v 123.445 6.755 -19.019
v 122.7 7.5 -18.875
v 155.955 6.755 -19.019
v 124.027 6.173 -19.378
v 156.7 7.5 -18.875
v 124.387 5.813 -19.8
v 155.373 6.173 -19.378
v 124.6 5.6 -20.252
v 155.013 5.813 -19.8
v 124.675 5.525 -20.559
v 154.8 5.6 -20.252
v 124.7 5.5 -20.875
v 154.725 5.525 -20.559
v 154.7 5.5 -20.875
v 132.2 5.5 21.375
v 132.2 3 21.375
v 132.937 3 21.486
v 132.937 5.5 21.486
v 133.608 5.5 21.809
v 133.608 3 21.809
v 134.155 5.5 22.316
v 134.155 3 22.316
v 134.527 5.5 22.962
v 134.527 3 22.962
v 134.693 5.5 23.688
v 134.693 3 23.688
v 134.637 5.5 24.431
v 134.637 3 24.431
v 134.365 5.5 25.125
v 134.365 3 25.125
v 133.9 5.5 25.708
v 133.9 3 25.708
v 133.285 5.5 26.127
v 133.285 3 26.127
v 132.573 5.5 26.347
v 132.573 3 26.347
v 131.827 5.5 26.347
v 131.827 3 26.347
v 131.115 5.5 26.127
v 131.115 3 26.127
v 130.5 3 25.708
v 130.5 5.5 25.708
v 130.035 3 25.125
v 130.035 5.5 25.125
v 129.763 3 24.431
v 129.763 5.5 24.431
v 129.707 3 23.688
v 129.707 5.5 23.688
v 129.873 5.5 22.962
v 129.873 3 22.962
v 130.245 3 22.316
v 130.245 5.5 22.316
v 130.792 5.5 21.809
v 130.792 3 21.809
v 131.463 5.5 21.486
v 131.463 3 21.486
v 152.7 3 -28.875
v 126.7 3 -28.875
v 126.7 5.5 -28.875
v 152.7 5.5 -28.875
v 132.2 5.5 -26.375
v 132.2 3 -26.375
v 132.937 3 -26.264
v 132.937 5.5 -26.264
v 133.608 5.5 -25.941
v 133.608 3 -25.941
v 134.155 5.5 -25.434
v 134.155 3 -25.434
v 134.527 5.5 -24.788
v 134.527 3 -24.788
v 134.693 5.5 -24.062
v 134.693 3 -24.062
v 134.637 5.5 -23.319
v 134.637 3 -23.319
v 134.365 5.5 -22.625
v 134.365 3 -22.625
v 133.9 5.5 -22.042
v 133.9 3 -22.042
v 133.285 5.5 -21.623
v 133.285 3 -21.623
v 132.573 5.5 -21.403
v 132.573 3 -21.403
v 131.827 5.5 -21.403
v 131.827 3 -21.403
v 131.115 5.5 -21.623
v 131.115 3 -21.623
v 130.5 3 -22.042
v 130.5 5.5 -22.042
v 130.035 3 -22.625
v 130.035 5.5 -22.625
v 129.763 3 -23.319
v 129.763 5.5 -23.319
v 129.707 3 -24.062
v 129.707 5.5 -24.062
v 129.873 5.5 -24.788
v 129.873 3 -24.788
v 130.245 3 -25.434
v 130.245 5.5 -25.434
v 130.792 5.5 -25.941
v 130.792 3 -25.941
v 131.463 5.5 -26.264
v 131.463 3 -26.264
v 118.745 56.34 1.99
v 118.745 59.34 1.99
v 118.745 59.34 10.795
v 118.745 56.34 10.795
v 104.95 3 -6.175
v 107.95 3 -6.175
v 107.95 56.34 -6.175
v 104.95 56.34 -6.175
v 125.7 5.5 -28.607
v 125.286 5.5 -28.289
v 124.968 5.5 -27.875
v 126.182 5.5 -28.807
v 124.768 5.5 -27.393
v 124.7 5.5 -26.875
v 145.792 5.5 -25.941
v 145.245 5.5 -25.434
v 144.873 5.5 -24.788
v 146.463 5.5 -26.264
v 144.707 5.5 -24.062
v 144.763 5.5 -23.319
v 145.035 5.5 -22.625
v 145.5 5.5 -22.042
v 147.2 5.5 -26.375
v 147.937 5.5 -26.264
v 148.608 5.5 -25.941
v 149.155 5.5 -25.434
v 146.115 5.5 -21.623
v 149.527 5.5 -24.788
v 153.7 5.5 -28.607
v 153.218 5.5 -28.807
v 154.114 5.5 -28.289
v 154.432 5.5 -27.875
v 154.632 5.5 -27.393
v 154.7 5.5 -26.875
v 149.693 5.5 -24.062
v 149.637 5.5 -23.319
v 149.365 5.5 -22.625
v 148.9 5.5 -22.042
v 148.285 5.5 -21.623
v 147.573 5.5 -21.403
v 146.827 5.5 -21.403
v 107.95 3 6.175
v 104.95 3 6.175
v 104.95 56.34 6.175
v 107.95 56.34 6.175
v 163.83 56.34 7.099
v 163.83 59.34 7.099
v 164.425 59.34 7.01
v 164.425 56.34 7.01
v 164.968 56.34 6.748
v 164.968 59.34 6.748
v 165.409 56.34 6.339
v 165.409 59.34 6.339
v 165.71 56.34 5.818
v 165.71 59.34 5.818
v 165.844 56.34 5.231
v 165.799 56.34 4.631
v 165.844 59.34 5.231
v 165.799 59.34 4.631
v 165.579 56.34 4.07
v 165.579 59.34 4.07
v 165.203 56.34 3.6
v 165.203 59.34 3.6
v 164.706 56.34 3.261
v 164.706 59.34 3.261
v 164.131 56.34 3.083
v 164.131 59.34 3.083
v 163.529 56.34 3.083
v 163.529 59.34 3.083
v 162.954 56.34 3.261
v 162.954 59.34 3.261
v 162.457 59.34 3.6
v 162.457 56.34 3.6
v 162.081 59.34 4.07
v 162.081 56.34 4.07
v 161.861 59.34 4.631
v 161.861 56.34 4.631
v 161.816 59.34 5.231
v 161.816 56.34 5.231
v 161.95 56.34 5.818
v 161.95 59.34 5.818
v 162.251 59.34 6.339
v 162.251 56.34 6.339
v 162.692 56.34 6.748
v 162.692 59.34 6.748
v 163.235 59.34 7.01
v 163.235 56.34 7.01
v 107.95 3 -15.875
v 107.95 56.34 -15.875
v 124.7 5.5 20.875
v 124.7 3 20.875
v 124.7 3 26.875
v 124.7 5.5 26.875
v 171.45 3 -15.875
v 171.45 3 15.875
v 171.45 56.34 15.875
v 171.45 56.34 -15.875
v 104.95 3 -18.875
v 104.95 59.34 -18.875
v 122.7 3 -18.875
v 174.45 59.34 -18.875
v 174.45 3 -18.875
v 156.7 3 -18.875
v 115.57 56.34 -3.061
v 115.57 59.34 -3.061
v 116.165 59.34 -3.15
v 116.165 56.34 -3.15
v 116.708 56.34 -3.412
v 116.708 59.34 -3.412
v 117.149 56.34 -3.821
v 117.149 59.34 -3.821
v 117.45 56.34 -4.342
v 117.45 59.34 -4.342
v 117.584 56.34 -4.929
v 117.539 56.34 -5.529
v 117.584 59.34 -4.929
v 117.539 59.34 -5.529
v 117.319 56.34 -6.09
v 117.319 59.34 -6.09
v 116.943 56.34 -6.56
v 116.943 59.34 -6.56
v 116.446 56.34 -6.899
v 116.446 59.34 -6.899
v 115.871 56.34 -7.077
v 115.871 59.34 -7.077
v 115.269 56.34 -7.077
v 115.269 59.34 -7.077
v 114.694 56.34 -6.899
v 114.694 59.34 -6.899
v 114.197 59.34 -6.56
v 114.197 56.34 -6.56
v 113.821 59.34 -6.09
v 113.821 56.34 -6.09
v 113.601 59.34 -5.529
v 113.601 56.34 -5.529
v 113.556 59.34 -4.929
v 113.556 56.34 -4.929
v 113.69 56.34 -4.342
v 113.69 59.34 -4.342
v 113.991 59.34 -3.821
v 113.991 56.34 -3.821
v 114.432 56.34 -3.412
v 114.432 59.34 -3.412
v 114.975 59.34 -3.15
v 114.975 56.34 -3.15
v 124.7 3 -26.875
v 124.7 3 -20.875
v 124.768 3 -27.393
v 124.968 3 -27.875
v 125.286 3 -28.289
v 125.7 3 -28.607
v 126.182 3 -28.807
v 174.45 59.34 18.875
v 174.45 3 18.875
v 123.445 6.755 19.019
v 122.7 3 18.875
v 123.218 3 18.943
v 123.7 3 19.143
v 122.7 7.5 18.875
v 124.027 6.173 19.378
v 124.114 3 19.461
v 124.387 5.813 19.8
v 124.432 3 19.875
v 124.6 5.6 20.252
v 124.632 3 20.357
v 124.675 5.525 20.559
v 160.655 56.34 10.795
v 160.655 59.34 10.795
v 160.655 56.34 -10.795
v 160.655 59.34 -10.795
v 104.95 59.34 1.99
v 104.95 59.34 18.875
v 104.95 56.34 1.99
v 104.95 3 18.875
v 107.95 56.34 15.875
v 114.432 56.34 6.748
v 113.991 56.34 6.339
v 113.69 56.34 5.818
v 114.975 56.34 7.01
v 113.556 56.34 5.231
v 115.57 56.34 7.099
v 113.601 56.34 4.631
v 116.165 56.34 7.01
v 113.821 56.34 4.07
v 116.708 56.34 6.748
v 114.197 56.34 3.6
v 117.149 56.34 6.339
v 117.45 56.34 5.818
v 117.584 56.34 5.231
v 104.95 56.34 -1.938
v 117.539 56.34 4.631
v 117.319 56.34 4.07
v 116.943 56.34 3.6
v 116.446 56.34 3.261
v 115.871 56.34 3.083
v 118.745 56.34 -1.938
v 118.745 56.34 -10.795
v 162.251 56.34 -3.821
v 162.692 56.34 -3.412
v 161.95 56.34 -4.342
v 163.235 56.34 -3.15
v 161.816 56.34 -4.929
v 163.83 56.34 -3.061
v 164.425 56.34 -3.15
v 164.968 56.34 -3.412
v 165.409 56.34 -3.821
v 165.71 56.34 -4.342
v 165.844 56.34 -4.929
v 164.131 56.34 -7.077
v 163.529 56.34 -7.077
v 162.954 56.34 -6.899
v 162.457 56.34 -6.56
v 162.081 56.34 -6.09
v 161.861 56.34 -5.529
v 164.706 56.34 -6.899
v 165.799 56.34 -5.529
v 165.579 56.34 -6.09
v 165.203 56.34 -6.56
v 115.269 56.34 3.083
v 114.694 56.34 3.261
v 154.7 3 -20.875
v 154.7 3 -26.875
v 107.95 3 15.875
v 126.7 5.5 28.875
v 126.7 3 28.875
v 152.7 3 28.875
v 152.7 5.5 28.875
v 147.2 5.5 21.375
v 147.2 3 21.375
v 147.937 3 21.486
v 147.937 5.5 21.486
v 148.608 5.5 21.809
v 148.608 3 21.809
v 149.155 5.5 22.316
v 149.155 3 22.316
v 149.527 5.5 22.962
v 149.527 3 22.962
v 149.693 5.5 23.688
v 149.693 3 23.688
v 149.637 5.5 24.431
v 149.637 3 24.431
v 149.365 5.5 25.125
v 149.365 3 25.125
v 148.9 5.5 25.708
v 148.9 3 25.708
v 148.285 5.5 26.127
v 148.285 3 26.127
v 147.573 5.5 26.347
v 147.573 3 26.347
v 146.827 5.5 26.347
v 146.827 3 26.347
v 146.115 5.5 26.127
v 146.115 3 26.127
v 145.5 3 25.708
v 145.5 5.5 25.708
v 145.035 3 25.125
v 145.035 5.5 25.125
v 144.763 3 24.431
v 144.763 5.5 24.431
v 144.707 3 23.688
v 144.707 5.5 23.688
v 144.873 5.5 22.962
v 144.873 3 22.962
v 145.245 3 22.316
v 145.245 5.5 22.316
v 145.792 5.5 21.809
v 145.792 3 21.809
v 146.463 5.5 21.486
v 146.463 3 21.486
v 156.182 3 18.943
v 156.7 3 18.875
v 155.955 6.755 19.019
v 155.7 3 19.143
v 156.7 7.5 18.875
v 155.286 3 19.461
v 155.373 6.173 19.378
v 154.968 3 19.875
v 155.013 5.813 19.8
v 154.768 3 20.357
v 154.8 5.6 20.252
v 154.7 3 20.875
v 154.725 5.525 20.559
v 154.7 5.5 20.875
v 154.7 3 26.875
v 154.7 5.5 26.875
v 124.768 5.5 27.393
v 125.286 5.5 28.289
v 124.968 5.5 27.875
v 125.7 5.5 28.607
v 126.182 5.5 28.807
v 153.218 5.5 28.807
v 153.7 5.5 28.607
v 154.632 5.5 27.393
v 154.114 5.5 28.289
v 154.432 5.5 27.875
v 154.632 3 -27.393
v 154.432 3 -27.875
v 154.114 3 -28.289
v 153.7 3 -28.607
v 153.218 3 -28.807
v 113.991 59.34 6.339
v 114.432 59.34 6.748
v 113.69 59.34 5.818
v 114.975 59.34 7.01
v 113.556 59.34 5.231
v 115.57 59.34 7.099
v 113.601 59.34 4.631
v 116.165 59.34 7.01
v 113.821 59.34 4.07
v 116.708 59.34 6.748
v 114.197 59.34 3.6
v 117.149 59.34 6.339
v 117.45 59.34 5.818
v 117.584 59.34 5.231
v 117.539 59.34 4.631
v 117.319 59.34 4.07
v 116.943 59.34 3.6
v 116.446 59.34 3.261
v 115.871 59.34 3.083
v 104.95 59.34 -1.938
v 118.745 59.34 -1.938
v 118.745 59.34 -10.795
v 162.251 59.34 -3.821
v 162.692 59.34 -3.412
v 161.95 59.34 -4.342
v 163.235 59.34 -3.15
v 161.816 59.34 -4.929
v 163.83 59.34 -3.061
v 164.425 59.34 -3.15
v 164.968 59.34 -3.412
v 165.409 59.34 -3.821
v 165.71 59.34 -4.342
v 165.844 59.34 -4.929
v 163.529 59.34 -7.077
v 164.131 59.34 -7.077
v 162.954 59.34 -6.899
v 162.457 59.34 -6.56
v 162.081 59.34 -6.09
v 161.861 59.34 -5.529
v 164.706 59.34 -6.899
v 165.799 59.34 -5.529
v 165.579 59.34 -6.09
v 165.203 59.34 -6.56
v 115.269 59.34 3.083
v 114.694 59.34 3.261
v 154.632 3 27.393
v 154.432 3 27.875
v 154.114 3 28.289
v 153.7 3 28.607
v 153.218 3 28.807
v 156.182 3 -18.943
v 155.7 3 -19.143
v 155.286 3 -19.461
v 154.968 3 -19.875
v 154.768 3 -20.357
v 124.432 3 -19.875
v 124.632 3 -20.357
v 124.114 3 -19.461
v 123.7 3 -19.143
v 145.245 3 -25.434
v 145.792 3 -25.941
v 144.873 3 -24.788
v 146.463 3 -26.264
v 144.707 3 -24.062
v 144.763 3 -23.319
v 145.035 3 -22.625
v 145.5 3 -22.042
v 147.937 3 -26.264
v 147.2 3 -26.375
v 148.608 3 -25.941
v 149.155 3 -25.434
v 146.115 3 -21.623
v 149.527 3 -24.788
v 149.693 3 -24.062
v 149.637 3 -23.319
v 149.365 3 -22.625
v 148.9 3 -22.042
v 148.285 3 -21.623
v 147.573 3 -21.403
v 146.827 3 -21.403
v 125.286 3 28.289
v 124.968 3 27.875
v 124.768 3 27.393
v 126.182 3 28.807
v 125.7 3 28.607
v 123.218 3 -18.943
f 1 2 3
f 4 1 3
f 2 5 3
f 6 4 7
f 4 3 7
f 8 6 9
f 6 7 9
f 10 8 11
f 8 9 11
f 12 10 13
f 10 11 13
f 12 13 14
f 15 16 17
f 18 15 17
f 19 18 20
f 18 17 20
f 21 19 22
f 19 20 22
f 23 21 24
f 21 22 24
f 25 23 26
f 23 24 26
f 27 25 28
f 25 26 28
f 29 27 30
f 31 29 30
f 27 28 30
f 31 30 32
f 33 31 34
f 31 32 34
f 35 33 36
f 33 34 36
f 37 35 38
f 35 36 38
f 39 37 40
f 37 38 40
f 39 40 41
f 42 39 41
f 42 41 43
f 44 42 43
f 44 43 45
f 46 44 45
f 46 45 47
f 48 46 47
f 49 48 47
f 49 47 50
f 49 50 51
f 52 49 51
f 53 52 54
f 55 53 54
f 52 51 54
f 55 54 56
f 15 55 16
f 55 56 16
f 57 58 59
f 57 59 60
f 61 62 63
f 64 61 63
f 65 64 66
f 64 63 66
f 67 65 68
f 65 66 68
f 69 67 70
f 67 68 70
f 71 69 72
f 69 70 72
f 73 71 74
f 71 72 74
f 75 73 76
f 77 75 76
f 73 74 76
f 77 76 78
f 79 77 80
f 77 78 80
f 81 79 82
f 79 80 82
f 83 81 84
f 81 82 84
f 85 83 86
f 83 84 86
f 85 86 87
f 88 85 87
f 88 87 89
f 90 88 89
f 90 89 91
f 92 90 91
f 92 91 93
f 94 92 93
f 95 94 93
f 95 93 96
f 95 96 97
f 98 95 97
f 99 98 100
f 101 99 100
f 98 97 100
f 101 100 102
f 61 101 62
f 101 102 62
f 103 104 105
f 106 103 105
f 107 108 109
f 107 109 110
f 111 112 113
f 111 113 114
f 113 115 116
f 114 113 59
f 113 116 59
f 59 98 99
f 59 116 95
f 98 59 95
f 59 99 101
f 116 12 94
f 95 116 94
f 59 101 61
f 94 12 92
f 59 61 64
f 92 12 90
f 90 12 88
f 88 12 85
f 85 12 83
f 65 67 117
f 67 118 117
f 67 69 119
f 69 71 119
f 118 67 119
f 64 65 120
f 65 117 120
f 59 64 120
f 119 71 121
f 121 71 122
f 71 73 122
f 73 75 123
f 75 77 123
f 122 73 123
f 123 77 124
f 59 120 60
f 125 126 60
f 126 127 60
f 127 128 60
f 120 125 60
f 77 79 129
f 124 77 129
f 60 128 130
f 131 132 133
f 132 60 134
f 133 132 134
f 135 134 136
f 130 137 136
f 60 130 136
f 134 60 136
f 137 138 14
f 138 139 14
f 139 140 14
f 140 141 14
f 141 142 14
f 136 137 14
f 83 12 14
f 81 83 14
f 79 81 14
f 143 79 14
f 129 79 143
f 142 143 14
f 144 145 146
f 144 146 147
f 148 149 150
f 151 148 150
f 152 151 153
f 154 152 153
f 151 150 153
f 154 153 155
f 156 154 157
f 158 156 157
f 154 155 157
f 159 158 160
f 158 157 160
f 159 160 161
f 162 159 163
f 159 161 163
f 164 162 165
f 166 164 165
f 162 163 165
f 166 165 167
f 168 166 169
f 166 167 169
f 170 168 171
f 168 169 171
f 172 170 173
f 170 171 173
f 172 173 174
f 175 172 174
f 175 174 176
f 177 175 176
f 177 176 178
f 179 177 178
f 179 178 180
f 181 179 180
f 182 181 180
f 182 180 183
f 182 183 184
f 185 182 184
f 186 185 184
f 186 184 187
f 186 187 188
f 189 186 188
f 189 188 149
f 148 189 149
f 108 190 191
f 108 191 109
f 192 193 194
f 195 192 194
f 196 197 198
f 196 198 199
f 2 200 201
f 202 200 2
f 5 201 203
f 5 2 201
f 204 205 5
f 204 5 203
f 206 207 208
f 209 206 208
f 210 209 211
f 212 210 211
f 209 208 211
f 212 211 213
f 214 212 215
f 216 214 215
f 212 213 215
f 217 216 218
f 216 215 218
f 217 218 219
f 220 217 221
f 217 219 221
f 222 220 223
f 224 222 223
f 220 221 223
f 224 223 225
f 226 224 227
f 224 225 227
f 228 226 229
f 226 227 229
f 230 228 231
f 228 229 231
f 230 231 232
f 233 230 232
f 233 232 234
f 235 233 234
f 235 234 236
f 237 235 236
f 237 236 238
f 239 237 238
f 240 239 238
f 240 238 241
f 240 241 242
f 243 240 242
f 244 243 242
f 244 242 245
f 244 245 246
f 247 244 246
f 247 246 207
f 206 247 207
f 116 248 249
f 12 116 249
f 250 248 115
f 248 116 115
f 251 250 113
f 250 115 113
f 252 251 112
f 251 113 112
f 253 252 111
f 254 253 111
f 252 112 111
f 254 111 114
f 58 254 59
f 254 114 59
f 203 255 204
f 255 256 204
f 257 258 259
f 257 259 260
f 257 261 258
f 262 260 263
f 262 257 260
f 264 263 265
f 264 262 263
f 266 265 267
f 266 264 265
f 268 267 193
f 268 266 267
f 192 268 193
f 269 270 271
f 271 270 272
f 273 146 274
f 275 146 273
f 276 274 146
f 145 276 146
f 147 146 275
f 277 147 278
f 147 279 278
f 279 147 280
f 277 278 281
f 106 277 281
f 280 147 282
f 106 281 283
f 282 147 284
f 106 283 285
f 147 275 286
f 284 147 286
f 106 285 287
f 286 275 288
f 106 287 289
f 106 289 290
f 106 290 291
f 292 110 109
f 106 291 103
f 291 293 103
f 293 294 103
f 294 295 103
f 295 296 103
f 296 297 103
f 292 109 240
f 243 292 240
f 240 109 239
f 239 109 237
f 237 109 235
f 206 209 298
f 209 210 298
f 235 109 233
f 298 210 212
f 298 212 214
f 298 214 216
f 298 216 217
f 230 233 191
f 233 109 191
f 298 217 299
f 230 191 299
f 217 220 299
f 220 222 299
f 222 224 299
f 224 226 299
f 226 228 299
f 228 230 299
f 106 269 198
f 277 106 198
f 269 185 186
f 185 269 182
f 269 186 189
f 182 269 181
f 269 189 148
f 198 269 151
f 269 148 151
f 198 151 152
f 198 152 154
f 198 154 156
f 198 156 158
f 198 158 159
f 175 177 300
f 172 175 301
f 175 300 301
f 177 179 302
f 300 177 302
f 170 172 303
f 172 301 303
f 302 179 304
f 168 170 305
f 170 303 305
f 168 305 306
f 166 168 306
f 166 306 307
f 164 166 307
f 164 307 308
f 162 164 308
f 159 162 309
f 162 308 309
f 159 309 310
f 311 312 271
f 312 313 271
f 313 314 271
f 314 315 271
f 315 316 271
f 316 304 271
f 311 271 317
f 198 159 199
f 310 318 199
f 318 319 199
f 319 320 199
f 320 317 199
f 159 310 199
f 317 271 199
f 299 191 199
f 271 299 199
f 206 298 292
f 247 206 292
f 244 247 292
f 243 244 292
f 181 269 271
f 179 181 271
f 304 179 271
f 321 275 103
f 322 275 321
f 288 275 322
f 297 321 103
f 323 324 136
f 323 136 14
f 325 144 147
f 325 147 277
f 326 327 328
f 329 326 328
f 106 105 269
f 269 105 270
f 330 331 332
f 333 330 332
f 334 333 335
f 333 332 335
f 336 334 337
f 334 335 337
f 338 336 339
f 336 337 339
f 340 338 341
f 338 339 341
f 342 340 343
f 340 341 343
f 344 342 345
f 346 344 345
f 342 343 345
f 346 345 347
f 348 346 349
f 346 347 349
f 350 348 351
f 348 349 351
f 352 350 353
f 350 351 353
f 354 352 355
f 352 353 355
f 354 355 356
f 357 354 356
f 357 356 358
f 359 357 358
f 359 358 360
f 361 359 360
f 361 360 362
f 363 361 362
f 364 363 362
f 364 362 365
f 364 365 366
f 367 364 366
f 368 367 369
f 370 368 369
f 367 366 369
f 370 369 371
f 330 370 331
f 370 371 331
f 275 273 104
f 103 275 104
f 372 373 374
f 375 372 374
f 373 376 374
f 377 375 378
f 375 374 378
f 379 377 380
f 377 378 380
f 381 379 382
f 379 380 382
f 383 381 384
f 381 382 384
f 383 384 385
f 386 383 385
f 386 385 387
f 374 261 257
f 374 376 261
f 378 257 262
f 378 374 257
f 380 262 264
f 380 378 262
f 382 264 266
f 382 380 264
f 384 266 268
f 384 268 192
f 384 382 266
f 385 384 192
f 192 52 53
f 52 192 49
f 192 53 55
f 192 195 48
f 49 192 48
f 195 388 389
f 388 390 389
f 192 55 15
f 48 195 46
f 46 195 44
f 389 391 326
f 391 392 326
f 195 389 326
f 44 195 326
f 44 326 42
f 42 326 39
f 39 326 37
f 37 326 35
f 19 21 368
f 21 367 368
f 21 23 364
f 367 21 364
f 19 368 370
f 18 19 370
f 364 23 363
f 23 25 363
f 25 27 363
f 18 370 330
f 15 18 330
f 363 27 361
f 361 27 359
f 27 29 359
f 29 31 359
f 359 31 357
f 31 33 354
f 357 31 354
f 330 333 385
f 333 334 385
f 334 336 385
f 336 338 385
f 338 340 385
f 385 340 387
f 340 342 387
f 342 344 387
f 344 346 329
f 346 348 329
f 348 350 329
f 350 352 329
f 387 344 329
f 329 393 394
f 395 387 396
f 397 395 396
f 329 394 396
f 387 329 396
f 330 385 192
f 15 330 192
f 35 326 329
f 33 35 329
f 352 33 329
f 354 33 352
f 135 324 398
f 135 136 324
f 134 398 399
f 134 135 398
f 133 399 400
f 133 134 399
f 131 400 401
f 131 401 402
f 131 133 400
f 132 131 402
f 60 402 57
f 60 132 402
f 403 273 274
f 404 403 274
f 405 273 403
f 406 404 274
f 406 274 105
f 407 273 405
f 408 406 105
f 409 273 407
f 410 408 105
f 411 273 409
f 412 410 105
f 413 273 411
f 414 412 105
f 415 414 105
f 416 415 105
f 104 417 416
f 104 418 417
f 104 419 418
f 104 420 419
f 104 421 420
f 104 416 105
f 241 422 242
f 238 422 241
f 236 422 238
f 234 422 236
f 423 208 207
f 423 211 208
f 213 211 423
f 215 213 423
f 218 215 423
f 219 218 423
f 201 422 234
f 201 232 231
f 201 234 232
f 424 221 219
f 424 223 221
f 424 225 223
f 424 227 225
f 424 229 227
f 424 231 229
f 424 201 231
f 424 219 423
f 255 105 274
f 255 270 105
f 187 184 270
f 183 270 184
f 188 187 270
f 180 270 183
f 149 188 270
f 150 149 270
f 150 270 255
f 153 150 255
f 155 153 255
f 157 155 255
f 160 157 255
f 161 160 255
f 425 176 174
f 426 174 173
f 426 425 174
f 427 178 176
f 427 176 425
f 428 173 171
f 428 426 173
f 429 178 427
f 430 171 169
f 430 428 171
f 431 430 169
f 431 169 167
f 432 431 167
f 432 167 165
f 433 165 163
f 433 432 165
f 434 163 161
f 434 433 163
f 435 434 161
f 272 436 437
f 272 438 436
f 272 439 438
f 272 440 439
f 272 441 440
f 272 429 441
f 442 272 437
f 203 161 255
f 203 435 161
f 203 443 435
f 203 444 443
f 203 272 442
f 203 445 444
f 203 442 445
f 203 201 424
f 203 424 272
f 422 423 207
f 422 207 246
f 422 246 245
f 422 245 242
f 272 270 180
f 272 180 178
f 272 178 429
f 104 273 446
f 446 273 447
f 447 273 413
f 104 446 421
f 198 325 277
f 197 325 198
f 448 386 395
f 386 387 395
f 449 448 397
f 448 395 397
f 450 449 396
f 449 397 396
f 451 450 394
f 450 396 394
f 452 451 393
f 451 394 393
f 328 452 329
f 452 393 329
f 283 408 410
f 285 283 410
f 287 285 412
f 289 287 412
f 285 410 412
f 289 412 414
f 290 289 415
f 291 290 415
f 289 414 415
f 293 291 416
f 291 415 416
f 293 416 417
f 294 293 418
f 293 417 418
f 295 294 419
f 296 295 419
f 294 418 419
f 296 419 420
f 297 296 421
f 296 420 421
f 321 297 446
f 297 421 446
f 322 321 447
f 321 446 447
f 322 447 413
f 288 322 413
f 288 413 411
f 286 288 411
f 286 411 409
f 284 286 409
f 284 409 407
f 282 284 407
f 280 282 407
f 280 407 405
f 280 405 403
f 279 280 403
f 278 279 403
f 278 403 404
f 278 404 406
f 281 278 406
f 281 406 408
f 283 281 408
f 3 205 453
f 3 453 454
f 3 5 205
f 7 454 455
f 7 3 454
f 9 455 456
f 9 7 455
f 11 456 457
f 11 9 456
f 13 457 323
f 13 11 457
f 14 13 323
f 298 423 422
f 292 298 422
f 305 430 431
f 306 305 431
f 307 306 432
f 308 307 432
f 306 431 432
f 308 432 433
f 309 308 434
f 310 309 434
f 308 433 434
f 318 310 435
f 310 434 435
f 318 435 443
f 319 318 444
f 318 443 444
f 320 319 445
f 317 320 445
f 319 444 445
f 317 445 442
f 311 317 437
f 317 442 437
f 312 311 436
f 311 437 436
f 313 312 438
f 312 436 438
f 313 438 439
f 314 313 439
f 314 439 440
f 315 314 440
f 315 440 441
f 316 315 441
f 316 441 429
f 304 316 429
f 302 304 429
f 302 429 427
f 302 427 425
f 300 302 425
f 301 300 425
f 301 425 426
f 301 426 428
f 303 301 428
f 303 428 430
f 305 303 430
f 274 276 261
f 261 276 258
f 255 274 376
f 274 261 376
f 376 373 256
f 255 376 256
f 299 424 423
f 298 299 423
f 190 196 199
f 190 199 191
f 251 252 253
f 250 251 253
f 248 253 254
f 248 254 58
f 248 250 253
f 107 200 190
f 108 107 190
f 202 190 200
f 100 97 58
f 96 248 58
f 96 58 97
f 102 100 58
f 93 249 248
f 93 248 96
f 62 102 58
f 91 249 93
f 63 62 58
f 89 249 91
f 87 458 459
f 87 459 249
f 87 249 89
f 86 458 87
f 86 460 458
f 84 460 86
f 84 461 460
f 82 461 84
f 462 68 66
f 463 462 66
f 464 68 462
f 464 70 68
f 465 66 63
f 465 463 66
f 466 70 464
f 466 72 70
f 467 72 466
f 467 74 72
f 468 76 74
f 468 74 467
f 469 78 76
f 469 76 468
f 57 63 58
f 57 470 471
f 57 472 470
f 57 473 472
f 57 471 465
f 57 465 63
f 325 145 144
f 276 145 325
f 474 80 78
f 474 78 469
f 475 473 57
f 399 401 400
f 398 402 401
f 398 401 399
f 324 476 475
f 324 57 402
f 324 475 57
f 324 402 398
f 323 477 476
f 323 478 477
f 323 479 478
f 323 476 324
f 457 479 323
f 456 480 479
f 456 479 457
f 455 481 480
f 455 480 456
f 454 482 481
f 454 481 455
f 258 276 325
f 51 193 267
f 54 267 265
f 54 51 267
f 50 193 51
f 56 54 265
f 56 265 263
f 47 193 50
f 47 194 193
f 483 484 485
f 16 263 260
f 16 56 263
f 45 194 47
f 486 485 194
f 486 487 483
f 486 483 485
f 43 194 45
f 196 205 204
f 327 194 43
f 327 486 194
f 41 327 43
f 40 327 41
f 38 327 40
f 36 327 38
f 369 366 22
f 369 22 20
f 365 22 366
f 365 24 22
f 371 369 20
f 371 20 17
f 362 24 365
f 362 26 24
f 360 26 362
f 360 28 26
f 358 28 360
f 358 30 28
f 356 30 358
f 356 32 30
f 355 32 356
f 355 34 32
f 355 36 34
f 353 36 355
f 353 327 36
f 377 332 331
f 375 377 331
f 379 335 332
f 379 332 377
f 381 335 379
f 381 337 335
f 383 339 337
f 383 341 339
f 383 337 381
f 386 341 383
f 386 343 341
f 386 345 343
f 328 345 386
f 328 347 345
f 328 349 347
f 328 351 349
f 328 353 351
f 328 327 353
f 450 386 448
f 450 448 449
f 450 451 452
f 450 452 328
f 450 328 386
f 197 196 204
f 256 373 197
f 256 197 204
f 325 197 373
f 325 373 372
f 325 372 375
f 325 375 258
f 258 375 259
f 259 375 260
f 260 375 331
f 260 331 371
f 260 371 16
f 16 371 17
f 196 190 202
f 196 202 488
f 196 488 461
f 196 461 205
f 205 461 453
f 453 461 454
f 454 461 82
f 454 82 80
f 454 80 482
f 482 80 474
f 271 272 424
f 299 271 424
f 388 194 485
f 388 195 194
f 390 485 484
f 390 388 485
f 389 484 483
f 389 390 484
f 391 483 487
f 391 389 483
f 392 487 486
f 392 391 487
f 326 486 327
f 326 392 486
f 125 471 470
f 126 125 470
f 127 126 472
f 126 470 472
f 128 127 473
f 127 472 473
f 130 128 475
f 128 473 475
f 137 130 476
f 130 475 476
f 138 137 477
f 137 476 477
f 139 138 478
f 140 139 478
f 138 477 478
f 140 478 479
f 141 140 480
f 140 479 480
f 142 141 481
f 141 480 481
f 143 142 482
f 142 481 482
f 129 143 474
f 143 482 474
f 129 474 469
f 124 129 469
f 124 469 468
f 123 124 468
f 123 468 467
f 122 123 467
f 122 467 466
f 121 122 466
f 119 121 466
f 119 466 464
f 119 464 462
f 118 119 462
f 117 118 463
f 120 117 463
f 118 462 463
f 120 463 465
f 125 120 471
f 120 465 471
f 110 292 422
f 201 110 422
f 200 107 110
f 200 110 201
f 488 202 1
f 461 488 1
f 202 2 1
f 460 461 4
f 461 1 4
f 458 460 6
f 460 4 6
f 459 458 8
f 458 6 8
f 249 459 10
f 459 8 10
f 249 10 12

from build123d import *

# Parameters (mm, degrees)
SKETCH1_R              = 2.54
SKETCH1_R_2            = 6.35
MAINBASEPLATE_DEPTH    = 3
PANTILT_EXTRUDE6_DEPTH = 53.34
SKETCH11_W             = 69.5
SKETCH11_H             = 37.75
BOSS_EXTRUDE7_DEPTH    = 3
SKETCH12_R             = 2.0193
CUT_EXTRUDE3_DEPTH     = 56.34
SKETCH32_W             = 712.395528774
SKETCH32_H             = 524.196017535
CUT_EXTRUDE11_DEPTH    = 3
SKETCH33_W             = 30
SKETCH33_H             = 10
SKETCH33_R             = 2.5
BOSS_EXTRUDE9_DEPTH    = 2.5
FILLET1_R              = 2


with BuildPart() as part:
    # Sketch1 → mainbaseplate (new body)
    with BuildSketch(Plane(origin=(0, 0, 0), x_dir=(1, 0, 0), z_dir=(0, 1, 0))):
        with BuildLine():
            Line((-223.52, -111.125), (223.52, -111.125))
            ThreePointArc((223.52, -111.125), (227.112102448, -109.637102448), (228.6, -106.045))
            Line((228.6, -106.045), (228.6, 106.045))
            ThreePointArc((228.6, 106.045), (227.112102448, 109.637102448), (223.52, 111.125))
            Line((223.52, 111.125), (-223.52, 111.125))
            ThreePointArc((-223.52, 111.125), (-227.112102448, 109.637102448), (-228.6, 106.045))
            Line((-228.6, 106.045), (-228.6, -106.045))
            ThreePointArc((-228.6, -106.045), (-227.112102448, -109.637102448), (-223.52, -111.125))
        make_face()
        with Locations(Location((127, 36.5125, 0), (0, 0, 270))):
            Circle(SKETCH1_R, mode=Mode.SUBTRACT)
        with Locations(Location((127, -36.5125, 0), (0, 0, 270))):
            Circle(SKETCH1_R, mode=Mode.SUBTRACT)
        with Locations(Location((-142.24, 36.5125, 0), (0, 0, 270))):
            Circle(SKETCH1_R, mode=Mode.SUBTRACT)
        with Locations(Location((-142.24, -36.5125, 0), (0, 0, 270))):
            Circle(SKETCH1_R, mode=Mode.SUBTRACT)
        with Locations(Location((209.55, 0, 0), (0, 0, 270))):
            Circle(SKETCH1_R_2, mode=Mode.SUBTRACT)
    extrude(amount=MAINBASEPLATE_DEPTH)

    # Sketch10 → PanTilt-Extrude6 (add)
    with BuildSketch(Plane(origin=(0, 3, 0), x_dir=(1, 0, 0), z_dir=(0, 1, 0))):
        Polygon((104.95, 18.875), (174.45, 18.875), (174.45, -18.875), (104.95, -18.875), (104.95, -6.175), (107.95, -6.175), (107.95, -15.875), (171.45, -15.875), (171.45, 15.875), (107.95, 15.875), (107.95, 6.175), (104.95, 6.175), align=None)
    extrude(amount=PANTILT_EXTRUDE6_DEPTH)

    # Sketch11 → Boss-Extrude7 (add)
    with BuildSketch(Plane(origin=(0, 56.34, 0), x_dir=(1, 0, 0), z_dir=(0, 1, 0))):
        with Locations((139.7, 0)):
            Rectangle(SKETCH11_W, SKETCH11_H)
    extrude(amount=BOSS_EXTRUDE7_DEPTH)

    # Sketch12 → Cut-Extrude3 (cut)
    with BuildSketch(Plane(origin=(0, 59.34, 0), x_dir=(1, 0, 0), z_dir=(0, 1, 0))):
        with Locations(Location((163.83, 5.08, 0), (0, 0, 270))):
            Circle(SKETCH12_R)
        with Locations(Location((163.83, -5.08, 0), (0, 0, 270))):
            Circle(SKETCH12_R)
        with Locations(Location((115.57, 5.08, 0), (0, 0, 270))):
            Circle(SKETCH12_R)
        with Locations(Location((115.57, -5.08, 0), (0, 0, 270))):
            Circle(SKETCH12_R)
        Polygon((118.745, 1.937698292), (104.95, 1.937698292), (95.841621454, 0), (104.95, -1.990085687), (118.745, -1.990085687), (118.745, -10.795), (160.655, -10.795), (160.655, 10.795), (118.745, 10.795), align=None)
    extrude(amount=-CUT_EXTRUDE3_DEPTH, mode=Mode.SUBTRACT)

    # Sketch32 → Cut-Extrude11 (cut)
    with BuildSketch(Plane.XZ):
        with Locations((-5.907824988, 36.768742763)):
            Rectangle(SKETCH32_W, SKETCH32_H)
    extrude(amount=-CUT_EXTRUDE11_DEPTH, mode=Mode.SUBTRACT)

    # Sketch33 → Boss-Extrude9 (add)
    # profile 1 of 2: a face of its own
    with BuildSketch(Plane.XZ.offset(-3)):
        with Locations((139.7, 23.875)):
            Rectangle(SKETCH33_W, SKETCH33_H)
        with Locations(Location((132.2, 23.875, 0), (0, 0, 270))):
            Circle(SKETCH33_R, mode=Mode.SUBTRACT)
        with Locations(Location((147.2, 23.875, 0), (0, 0, 270))):
            Circle(SKETCH33_R, mode=Mode.SUBTRACT)
    # profile 2 of 2: a face of its own
    with BuildSketch(Plane.XZ.offset(-3)):
        with Locations((139.7, -23.875)):
            Rectangle(SKETCH33_W, SKETCH33_H)
        with Locations(Location((132.2, -23.875, 0), (0, 0, 270))):
            Circle(SKETCH33_R, mode=Mode.SUBTRACT)
        with Locations(Location((147.2, -23.875, 0), (0, 0, 270))):
            Circle(SKETCH33_R, mode=Mode.SUBTRACT)
    extrude(amount=-BOSS_EXTRUDE9_DEPTH)

    # Fillet1
    fillet1_edges = [part.edges().sort_by_distance(p)[0] for p in [
        (124.7, 4.25, 28.875),
        (154.7, 4.25, 28.875),
        (154.7, 4.25, 18.875),
        (124.7, 4.25, 18.875),
        (139.7, 5.5, 18.875),
        (124.7, 4.25, -18.875),
        (154.7, 4.25, -18.875),
        (154.7, 4.25, -28.875),
        (124.7, 4.25, -28.875),
        (139.7, 5.5, -18.875),
    ]]
    fillet(fillet1_edges, radius=FILLET1_R)


solid = part.part
